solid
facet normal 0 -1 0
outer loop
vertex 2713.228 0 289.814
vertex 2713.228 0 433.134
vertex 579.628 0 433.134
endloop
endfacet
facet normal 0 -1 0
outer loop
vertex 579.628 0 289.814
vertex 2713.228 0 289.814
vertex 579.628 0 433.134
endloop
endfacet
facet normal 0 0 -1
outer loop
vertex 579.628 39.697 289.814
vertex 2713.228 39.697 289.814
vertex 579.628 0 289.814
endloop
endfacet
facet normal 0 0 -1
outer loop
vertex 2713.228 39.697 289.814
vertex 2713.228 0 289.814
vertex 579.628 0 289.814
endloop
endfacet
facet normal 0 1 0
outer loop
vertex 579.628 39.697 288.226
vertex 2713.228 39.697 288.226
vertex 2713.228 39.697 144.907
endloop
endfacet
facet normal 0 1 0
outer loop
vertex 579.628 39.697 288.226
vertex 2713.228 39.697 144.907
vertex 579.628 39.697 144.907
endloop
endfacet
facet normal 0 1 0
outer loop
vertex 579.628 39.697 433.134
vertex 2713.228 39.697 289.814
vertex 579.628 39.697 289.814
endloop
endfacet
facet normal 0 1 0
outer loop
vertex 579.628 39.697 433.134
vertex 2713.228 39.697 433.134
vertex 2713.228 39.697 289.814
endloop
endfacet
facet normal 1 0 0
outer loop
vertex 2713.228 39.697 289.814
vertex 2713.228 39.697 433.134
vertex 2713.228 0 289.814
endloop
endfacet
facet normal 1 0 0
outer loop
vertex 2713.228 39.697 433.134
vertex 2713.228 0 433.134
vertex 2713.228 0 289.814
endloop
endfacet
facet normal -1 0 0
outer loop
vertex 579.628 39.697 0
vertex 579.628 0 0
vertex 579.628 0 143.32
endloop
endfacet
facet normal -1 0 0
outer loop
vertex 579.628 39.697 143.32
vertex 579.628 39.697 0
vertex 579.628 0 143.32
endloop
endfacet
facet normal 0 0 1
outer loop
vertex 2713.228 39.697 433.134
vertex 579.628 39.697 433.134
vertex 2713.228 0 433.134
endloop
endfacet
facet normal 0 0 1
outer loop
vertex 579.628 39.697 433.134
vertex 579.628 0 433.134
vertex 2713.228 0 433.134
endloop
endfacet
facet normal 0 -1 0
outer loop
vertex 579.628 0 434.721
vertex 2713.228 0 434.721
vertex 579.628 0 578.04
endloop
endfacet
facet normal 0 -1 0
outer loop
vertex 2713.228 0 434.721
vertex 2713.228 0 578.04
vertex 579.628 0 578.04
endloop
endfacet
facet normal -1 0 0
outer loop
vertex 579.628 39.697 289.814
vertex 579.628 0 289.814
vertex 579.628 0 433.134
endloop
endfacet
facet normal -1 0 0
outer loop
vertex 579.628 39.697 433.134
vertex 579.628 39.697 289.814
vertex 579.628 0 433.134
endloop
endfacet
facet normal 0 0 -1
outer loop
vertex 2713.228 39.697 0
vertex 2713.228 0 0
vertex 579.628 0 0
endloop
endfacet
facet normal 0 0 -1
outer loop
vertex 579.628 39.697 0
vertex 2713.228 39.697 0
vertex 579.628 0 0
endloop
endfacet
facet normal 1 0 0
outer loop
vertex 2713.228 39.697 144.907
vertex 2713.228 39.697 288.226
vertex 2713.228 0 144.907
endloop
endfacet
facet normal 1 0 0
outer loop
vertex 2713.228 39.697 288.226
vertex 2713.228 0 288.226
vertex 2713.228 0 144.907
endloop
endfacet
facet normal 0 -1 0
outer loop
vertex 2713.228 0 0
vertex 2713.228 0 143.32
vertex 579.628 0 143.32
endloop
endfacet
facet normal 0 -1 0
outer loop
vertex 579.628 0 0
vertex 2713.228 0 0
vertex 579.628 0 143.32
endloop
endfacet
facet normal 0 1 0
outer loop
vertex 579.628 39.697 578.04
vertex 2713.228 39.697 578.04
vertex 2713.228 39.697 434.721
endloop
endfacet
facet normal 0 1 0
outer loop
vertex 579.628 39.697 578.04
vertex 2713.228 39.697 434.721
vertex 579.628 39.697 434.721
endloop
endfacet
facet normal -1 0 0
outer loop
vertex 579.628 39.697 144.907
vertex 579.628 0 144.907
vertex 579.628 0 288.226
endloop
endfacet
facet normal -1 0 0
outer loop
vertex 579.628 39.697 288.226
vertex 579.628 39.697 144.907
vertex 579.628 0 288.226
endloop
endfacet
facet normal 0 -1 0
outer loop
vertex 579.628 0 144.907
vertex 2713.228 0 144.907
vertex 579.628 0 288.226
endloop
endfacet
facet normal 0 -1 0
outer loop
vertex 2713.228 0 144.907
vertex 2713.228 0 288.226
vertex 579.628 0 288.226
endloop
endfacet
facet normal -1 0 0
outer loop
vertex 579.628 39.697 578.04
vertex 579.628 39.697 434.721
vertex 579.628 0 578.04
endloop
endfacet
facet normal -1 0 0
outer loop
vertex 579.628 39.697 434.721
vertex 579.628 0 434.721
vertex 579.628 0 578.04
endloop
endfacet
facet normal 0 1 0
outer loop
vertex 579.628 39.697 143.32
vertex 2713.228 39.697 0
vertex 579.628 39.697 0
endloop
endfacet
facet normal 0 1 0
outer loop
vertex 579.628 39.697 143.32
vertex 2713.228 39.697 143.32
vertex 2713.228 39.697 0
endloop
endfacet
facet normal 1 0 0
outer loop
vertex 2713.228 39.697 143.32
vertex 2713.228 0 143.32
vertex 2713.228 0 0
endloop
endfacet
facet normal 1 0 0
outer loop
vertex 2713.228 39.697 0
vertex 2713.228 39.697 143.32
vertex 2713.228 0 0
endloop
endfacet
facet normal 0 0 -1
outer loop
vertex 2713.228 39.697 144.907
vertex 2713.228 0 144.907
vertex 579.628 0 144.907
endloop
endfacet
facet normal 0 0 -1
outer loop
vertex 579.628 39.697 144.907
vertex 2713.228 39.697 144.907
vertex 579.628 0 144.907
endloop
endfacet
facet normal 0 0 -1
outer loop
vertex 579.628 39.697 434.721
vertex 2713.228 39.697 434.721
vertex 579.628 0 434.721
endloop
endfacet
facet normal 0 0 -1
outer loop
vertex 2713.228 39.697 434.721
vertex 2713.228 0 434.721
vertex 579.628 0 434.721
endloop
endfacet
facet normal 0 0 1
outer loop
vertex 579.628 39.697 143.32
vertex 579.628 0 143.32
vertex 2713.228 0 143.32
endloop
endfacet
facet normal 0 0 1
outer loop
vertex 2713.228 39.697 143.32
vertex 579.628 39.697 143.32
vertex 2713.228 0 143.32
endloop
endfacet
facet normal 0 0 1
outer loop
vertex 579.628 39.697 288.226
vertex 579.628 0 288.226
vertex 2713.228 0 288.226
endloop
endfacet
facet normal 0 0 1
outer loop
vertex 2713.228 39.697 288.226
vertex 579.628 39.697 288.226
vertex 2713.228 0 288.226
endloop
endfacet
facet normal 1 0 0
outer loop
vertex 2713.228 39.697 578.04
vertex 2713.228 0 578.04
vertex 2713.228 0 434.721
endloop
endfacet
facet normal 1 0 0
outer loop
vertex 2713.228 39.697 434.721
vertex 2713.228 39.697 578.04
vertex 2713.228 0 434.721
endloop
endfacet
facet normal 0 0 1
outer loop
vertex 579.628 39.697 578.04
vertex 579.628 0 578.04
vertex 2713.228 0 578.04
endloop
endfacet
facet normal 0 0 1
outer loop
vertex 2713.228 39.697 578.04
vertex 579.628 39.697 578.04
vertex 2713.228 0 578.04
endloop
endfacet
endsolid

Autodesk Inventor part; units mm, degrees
ref_plane "YZ Plane" through (0, 0, 0) normal (1, 0, 0) x (0, 1, 0)
ref_plane "XZ Plane" through (0, 0, 0) normal (0, 1, 0) x (-1, 0, 0)
ref_plane "XY Plane" through (0, 0, 0) normal (0, 0, 1) x (1, 0, 0)
sketch "Ideal" plane through (0, 0, 0) normal (0, 1, 0) x (-1, 0, 0)
  line L0 (0, 0) -> (-2438.4, 0)
  line L1 (-2438.4, 0) -> (-2438.4, 609.6)
  line L2 (-2438.4, 609.6) -> (-609.6, 609.6)
  line L3 (-609.6, 609.6) -> (-609.6, 1219.2)
  line L4 (-609.6, 1219.2) -> (0, 1219.2)
  line L5 (0, 1219.2) -> (0, 0)
  dimension "d0" = 2438.4
  dimension "d1" = 1219.2
  dimension "d2" = 609.6
  dimension "d3" = 609.6
  dimension "d4" = 1828.8
sketch "Primary Top" plane through (0, 0, 0) normal (0, 1, 0) x (-1, 0, 0)
  line L0 (-2713.228, 0) -> (-579.628, 0)
  line L1 (-579.628, 0) -> (-579.628, 143.3195)
  line L2 (-579.628, 143.3195) -> (-2713.228, 143.3195)
  line L3 (-2713.228, 143.3195) -> (-2713.228, 0)
  line L4 (-2713.228, 144.907) -> (-579.628, 144.907)
  line L5 (-579.628, 144.907) -> (-579.628, 288.2265)
  line L6 (-579.628, 288.2265) -> (-2713.228, 288.2265)
  line L7 (-2713.228, 288.2265) -> (-2713.228, 144.907)
  line L8 (-2713.228, 289.814) -> (-579.628, 289.814)
  line L9 (-579.628, 289.814) -> (-579.628, 433.1335)
  line L10 (-579.628, 433.1335) -> (-2713.228, 433.1335)
  line L11 (-2713.228, 433.1335) -> (-2713.228, 289.814)
  line L12 (-2713.228, 434.721) -> (-579.628, 434.721)
  line L13 (-579.628, 434.721) -> (-579.628, 578.0405)
  line L14 (-579.628, 578.0405) -> (-2713.228, 578.0405)
  line L15 (-2713.228, 578.0405) -> (-2713.228, 434.721)
  point P0 (0, 0)
  dimension "d5" = 143.3195
  dimension "d6" = 143.3195
  dimension "d7" = 143.3195
  dimension "d8" = 143.3195
  dimension "d9" = 2133.6
  dimension "d11" = 1.5875
  dimension "d12" = 1.5875
  dimension "d13" = 1.5875
  dimension "d17" = 579.628
extrude "Extrusion1" add sketch "Primary Top" along normal blind 39.6966
equation "\"d5\" = w_2x6"
equation "\"d6\" = d5"
equation "\"d7\" = d5"
equation "\"d8\" = d5"
equation "\"d11\" = plank_tol"
equation "\"d12\" = plank_tol"
equation "\"d13\" = plank_tol"
equation "\"d17\" = 4 * w_2x6 + 4 * plank_tol"
equation "\"d14\" = h_2x6"
equation "\"l_2x4\" = 2438.4"
equation "\"w_2x4\" = 91.059"
equation "\"h_2x4\" = 39.69657"
equation "\"l_2x6\" = 2438.4"
equation "\"w_2x6\" = 143.3195"
equation "\"h_2x6\" = h_2x4"
equation "\"plank_tol\" = 1.5875"
properties part number "Desk Top Primary" material "Wood (Birch - Stained)"
